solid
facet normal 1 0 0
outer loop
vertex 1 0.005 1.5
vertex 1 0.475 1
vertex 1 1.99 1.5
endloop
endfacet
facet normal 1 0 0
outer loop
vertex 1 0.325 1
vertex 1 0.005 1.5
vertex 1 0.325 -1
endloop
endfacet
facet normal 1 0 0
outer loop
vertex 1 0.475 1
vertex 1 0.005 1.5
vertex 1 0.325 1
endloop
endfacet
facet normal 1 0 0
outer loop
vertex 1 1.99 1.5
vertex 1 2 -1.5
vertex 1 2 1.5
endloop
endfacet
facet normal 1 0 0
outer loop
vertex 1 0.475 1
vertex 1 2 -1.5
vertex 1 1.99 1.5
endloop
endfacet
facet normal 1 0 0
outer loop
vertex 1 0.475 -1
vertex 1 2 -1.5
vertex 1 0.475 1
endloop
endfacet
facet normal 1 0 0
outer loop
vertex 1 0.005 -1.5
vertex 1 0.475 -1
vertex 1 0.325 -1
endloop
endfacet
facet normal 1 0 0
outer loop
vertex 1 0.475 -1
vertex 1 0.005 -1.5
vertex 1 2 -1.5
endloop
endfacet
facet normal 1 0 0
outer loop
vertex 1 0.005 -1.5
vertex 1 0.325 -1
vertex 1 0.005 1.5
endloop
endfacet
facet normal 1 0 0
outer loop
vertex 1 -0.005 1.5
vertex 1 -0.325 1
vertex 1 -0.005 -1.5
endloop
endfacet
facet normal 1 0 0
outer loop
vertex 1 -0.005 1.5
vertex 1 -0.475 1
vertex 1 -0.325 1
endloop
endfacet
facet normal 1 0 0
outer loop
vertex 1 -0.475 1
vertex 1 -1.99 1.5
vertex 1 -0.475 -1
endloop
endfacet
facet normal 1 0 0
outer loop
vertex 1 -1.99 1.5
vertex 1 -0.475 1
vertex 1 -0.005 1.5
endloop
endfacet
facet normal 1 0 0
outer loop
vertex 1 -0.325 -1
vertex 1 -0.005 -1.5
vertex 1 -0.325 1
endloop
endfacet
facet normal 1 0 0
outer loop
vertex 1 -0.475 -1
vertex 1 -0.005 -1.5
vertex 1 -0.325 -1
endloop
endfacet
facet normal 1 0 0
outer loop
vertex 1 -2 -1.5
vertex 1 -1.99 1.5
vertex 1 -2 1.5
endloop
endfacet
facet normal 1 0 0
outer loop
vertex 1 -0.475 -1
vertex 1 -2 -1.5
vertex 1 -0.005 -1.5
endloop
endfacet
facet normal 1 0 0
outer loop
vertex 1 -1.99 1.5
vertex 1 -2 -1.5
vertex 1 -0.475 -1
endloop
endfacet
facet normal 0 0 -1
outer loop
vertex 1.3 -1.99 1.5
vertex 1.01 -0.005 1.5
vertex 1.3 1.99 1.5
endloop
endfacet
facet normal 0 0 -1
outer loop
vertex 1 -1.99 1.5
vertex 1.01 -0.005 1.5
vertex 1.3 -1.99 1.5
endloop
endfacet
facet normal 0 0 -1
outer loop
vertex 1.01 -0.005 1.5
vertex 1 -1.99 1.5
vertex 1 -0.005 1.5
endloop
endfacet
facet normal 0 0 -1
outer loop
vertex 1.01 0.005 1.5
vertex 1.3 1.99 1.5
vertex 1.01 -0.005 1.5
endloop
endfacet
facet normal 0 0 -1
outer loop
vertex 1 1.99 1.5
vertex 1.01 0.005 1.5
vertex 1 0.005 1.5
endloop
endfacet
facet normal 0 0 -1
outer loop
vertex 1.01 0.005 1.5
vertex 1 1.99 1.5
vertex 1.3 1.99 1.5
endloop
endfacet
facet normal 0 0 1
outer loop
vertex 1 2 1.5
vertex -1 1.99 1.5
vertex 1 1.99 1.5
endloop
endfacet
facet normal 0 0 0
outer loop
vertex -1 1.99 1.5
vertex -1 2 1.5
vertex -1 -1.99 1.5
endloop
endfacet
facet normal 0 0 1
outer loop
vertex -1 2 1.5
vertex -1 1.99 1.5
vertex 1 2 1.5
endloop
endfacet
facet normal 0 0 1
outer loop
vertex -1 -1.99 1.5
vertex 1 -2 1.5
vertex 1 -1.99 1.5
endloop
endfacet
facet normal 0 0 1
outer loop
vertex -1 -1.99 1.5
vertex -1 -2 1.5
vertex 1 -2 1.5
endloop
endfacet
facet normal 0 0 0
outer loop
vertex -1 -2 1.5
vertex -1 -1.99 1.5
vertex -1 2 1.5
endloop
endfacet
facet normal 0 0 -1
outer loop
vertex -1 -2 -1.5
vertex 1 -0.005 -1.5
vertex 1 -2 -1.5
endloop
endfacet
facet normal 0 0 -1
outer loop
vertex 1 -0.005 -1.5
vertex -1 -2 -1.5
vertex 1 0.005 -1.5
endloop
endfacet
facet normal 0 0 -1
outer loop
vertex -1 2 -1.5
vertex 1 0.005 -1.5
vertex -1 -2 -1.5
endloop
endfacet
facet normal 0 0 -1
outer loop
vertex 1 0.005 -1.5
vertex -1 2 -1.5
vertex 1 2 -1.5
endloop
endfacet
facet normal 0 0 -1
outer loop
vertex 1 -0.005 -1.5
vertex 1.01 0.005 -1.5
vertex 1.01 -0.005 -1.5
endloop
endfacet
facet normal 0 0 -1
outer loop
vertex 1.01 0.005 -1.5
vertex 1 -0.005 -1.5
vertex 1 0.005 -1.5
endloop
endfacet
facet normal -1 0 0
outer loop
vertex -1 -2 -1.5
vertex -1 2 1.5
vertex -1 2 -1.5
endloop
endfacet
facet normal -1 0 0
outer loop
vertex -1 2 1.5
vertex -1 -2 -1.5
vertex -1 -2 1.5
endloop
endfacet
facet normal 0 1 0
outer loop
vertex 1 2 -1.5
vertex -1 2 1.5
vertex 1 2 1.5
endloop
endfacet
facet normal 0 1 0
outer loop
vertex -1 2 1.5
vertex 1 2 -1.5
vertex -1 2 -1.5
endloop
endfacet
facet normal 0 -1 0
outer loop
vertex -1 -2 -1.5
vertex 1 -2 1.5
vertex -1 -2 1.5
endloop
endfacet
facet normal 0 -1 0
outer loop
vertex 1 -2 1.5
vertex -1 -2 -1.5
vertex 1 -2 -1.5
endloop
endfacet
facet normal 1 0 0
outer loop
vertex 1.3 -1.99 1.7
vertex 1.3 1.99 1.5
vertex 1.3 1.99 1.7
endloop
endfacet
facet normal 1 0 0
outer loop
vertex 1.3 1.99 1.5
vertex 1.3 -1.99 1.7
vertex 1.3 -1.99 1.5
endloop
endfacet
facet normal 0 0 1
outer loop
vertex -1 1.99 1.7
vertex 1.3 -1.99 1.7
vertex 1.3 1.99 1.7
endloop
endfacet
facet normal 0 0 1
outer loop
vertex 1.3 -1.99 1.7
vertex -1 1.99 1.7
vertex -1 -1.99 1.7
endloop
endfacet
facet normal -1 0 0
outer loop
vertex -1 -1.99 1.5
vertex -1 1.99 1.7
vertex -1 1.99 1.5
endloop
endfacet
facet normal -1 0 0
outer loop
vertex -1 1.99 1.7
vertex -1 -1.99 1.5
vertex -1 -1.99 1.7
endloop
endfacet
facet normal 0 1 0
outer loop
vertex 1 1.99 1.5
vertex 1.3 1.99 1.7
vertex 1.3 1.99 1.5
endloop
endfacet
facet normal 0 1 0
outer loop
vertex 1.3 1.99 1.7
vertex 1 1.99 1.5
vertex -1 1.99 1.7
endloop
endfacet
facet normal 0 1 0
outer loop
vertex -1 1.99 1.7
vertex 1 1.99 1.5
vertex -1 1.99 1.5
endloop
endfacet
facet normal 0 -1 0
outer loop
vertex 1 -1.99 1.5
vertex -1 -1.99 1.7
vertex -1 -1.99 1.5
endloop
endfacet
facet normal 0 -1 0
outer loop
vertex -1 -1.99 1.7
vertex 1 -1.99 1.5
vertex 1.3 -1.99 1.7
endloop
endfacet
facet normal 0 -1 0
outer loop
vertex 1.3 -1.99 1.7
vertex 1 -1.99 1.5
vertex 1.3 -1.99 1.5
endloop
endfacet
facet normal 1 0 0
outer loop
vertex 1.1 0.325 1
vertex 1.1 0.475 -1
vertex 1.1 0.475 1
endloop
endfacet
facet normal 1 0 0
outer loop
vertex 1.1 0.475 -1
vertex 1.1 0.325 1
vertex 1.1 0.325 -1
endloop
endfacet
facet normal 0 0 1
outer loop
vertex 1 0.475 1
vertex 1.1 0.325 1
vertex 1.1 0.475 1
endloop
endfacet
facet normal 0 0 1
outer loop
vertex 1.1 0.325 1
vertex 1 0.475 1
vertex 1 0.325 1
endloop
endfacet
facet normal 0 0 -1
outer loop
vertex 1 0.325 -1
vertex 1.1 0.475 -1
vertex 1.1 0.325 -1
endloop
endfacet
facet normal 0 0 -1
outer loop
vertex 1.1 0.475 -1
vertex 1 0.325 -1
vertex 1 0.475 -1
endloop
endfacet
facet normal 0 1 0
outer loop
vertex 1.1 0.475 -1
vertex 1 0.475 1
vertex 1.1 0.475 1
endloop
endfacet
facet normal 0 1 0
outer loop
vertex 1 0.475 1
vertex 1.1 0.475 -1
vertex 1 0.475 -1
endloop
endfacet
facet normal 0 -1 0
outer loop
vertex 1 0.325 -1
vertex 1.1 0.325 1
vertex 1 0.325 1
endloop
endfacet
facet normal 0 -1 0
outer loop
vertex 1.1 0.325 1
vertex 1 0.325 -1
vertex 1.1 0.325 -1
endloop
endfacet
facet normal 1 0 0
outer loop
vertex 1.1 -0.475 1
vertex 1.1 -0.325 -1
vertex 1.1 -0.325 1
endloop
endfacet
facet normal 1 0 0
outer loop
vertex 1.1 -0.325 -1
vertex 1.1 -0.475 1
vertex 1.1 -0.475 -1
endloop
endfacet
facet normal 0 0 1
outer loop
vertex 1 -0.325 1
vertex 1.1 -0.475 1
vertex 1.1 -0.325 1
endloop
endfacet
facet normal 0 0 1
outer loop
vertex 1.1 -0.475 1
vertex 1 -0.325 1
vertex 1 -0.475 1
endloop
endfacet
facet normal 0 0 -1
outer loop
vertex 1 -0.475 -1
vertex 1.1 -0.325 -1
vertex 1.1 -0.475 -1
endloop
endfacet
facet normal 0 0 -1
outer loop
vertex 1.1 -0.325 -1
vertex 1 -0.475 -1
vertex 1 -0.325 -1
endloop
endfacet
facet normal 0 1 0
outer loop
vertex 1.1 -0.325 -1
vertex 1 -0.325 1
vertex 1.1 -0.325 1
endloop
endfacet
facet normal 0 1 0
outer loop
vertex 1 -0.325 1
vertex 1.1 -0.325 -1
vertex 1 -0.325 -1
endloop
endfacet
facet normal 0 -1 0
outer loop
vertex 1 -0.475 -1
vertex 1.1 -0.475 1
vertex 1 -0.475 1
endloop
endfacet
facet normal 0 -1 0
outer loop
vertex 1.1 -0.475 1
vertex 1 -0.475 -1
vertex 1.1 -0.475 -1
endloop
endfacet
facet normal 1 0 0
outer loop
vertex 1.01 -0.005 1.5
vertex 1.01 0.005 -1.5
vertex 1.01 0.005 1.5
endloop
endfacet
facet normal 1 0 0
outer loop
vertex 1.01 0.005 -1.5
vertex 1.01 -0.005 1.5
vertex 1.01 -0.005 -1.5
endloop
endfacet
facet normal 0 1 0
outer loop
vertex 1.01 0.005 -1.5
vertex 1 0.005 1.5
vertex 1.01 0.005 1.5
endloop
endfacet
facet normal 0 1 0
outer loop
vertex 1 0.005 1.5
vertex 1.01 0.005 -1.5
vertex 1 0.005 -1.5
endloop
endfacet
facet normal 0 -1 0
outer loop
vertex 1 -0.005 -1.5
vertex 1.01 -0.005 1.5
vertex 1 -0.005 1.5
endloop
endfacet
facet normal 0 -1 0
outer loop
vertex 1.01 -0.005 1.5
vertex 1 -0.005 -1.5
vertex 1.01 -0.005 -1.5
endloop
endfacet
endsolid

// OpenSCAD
module Base_cabinet_01(){

    color("#9e9e9e")
    cube([2,4,3], center = true);              // Main Body

    translate([0.15,0.0,1.6]){       
        color("#c2c2c2")
        cube([2.3,3.98,0.2], center = true);   // Upper part
    }
    translate([1.05,0.4,0]){                
        color("#c2c2c2")
        cube([0.1,0.15,2], center = true);    // Handle
    }
    translate([1.05,-0.4,0]){               
        color("#c2c2c2")
        cube([0.1,0.15,2], center = true);    // Handle
    }
    translate([1.005,0,0]){       
        color("#000000")
        cube([0.01,0.01,3], center = true);   // Black Line
    }

}

Base_cabinet_01();


// Written by Nicolì Angelo (Gengio) 2024: 
// MIT License


//Permission is hereby granted, free of charge, to any person obtaining a copy of this software and associated documentation files (the "Software"), to deal in the Software without restriction, including without limitation the rights to use, copy, modify, merge, publish, distribute, sublicense, and/or sell copies of the Software, and to permit persons to whom the Software is furnished to do so, subject to the following conditions:

//The above copyright notice and this permission notice shall be included in all copies or substantial portions of the Software.

//THE SOFTWARE IS PROVIDED "AS IS", WITHOUT WARRANTY OF ANY KIND, EXPRESS OR IMPLIED, INCLUDING BUT NOT LIMITED TO THE WARRANTIES OF MERCHANTABILITY, FITNESS FOR A PARTICULAR PURPOSE AND NONINFRINGEMENT. IN NO EVENT SHALL THE AUTHORS OR COPYRIGHT HOLDERS BE LIABLE FOR ANY CLAIM, DAMAGES OR OTHER LIABILITY, WHETHER IN AN ACTION OF CONTRACT, TORT OR OTHERWISE, ARISING FROM, OUT OF OR IN CONNECTION WITH THE SOFTWARE OR THE USE OR OTHER DEALINGS IN THE SOFTWARE.
